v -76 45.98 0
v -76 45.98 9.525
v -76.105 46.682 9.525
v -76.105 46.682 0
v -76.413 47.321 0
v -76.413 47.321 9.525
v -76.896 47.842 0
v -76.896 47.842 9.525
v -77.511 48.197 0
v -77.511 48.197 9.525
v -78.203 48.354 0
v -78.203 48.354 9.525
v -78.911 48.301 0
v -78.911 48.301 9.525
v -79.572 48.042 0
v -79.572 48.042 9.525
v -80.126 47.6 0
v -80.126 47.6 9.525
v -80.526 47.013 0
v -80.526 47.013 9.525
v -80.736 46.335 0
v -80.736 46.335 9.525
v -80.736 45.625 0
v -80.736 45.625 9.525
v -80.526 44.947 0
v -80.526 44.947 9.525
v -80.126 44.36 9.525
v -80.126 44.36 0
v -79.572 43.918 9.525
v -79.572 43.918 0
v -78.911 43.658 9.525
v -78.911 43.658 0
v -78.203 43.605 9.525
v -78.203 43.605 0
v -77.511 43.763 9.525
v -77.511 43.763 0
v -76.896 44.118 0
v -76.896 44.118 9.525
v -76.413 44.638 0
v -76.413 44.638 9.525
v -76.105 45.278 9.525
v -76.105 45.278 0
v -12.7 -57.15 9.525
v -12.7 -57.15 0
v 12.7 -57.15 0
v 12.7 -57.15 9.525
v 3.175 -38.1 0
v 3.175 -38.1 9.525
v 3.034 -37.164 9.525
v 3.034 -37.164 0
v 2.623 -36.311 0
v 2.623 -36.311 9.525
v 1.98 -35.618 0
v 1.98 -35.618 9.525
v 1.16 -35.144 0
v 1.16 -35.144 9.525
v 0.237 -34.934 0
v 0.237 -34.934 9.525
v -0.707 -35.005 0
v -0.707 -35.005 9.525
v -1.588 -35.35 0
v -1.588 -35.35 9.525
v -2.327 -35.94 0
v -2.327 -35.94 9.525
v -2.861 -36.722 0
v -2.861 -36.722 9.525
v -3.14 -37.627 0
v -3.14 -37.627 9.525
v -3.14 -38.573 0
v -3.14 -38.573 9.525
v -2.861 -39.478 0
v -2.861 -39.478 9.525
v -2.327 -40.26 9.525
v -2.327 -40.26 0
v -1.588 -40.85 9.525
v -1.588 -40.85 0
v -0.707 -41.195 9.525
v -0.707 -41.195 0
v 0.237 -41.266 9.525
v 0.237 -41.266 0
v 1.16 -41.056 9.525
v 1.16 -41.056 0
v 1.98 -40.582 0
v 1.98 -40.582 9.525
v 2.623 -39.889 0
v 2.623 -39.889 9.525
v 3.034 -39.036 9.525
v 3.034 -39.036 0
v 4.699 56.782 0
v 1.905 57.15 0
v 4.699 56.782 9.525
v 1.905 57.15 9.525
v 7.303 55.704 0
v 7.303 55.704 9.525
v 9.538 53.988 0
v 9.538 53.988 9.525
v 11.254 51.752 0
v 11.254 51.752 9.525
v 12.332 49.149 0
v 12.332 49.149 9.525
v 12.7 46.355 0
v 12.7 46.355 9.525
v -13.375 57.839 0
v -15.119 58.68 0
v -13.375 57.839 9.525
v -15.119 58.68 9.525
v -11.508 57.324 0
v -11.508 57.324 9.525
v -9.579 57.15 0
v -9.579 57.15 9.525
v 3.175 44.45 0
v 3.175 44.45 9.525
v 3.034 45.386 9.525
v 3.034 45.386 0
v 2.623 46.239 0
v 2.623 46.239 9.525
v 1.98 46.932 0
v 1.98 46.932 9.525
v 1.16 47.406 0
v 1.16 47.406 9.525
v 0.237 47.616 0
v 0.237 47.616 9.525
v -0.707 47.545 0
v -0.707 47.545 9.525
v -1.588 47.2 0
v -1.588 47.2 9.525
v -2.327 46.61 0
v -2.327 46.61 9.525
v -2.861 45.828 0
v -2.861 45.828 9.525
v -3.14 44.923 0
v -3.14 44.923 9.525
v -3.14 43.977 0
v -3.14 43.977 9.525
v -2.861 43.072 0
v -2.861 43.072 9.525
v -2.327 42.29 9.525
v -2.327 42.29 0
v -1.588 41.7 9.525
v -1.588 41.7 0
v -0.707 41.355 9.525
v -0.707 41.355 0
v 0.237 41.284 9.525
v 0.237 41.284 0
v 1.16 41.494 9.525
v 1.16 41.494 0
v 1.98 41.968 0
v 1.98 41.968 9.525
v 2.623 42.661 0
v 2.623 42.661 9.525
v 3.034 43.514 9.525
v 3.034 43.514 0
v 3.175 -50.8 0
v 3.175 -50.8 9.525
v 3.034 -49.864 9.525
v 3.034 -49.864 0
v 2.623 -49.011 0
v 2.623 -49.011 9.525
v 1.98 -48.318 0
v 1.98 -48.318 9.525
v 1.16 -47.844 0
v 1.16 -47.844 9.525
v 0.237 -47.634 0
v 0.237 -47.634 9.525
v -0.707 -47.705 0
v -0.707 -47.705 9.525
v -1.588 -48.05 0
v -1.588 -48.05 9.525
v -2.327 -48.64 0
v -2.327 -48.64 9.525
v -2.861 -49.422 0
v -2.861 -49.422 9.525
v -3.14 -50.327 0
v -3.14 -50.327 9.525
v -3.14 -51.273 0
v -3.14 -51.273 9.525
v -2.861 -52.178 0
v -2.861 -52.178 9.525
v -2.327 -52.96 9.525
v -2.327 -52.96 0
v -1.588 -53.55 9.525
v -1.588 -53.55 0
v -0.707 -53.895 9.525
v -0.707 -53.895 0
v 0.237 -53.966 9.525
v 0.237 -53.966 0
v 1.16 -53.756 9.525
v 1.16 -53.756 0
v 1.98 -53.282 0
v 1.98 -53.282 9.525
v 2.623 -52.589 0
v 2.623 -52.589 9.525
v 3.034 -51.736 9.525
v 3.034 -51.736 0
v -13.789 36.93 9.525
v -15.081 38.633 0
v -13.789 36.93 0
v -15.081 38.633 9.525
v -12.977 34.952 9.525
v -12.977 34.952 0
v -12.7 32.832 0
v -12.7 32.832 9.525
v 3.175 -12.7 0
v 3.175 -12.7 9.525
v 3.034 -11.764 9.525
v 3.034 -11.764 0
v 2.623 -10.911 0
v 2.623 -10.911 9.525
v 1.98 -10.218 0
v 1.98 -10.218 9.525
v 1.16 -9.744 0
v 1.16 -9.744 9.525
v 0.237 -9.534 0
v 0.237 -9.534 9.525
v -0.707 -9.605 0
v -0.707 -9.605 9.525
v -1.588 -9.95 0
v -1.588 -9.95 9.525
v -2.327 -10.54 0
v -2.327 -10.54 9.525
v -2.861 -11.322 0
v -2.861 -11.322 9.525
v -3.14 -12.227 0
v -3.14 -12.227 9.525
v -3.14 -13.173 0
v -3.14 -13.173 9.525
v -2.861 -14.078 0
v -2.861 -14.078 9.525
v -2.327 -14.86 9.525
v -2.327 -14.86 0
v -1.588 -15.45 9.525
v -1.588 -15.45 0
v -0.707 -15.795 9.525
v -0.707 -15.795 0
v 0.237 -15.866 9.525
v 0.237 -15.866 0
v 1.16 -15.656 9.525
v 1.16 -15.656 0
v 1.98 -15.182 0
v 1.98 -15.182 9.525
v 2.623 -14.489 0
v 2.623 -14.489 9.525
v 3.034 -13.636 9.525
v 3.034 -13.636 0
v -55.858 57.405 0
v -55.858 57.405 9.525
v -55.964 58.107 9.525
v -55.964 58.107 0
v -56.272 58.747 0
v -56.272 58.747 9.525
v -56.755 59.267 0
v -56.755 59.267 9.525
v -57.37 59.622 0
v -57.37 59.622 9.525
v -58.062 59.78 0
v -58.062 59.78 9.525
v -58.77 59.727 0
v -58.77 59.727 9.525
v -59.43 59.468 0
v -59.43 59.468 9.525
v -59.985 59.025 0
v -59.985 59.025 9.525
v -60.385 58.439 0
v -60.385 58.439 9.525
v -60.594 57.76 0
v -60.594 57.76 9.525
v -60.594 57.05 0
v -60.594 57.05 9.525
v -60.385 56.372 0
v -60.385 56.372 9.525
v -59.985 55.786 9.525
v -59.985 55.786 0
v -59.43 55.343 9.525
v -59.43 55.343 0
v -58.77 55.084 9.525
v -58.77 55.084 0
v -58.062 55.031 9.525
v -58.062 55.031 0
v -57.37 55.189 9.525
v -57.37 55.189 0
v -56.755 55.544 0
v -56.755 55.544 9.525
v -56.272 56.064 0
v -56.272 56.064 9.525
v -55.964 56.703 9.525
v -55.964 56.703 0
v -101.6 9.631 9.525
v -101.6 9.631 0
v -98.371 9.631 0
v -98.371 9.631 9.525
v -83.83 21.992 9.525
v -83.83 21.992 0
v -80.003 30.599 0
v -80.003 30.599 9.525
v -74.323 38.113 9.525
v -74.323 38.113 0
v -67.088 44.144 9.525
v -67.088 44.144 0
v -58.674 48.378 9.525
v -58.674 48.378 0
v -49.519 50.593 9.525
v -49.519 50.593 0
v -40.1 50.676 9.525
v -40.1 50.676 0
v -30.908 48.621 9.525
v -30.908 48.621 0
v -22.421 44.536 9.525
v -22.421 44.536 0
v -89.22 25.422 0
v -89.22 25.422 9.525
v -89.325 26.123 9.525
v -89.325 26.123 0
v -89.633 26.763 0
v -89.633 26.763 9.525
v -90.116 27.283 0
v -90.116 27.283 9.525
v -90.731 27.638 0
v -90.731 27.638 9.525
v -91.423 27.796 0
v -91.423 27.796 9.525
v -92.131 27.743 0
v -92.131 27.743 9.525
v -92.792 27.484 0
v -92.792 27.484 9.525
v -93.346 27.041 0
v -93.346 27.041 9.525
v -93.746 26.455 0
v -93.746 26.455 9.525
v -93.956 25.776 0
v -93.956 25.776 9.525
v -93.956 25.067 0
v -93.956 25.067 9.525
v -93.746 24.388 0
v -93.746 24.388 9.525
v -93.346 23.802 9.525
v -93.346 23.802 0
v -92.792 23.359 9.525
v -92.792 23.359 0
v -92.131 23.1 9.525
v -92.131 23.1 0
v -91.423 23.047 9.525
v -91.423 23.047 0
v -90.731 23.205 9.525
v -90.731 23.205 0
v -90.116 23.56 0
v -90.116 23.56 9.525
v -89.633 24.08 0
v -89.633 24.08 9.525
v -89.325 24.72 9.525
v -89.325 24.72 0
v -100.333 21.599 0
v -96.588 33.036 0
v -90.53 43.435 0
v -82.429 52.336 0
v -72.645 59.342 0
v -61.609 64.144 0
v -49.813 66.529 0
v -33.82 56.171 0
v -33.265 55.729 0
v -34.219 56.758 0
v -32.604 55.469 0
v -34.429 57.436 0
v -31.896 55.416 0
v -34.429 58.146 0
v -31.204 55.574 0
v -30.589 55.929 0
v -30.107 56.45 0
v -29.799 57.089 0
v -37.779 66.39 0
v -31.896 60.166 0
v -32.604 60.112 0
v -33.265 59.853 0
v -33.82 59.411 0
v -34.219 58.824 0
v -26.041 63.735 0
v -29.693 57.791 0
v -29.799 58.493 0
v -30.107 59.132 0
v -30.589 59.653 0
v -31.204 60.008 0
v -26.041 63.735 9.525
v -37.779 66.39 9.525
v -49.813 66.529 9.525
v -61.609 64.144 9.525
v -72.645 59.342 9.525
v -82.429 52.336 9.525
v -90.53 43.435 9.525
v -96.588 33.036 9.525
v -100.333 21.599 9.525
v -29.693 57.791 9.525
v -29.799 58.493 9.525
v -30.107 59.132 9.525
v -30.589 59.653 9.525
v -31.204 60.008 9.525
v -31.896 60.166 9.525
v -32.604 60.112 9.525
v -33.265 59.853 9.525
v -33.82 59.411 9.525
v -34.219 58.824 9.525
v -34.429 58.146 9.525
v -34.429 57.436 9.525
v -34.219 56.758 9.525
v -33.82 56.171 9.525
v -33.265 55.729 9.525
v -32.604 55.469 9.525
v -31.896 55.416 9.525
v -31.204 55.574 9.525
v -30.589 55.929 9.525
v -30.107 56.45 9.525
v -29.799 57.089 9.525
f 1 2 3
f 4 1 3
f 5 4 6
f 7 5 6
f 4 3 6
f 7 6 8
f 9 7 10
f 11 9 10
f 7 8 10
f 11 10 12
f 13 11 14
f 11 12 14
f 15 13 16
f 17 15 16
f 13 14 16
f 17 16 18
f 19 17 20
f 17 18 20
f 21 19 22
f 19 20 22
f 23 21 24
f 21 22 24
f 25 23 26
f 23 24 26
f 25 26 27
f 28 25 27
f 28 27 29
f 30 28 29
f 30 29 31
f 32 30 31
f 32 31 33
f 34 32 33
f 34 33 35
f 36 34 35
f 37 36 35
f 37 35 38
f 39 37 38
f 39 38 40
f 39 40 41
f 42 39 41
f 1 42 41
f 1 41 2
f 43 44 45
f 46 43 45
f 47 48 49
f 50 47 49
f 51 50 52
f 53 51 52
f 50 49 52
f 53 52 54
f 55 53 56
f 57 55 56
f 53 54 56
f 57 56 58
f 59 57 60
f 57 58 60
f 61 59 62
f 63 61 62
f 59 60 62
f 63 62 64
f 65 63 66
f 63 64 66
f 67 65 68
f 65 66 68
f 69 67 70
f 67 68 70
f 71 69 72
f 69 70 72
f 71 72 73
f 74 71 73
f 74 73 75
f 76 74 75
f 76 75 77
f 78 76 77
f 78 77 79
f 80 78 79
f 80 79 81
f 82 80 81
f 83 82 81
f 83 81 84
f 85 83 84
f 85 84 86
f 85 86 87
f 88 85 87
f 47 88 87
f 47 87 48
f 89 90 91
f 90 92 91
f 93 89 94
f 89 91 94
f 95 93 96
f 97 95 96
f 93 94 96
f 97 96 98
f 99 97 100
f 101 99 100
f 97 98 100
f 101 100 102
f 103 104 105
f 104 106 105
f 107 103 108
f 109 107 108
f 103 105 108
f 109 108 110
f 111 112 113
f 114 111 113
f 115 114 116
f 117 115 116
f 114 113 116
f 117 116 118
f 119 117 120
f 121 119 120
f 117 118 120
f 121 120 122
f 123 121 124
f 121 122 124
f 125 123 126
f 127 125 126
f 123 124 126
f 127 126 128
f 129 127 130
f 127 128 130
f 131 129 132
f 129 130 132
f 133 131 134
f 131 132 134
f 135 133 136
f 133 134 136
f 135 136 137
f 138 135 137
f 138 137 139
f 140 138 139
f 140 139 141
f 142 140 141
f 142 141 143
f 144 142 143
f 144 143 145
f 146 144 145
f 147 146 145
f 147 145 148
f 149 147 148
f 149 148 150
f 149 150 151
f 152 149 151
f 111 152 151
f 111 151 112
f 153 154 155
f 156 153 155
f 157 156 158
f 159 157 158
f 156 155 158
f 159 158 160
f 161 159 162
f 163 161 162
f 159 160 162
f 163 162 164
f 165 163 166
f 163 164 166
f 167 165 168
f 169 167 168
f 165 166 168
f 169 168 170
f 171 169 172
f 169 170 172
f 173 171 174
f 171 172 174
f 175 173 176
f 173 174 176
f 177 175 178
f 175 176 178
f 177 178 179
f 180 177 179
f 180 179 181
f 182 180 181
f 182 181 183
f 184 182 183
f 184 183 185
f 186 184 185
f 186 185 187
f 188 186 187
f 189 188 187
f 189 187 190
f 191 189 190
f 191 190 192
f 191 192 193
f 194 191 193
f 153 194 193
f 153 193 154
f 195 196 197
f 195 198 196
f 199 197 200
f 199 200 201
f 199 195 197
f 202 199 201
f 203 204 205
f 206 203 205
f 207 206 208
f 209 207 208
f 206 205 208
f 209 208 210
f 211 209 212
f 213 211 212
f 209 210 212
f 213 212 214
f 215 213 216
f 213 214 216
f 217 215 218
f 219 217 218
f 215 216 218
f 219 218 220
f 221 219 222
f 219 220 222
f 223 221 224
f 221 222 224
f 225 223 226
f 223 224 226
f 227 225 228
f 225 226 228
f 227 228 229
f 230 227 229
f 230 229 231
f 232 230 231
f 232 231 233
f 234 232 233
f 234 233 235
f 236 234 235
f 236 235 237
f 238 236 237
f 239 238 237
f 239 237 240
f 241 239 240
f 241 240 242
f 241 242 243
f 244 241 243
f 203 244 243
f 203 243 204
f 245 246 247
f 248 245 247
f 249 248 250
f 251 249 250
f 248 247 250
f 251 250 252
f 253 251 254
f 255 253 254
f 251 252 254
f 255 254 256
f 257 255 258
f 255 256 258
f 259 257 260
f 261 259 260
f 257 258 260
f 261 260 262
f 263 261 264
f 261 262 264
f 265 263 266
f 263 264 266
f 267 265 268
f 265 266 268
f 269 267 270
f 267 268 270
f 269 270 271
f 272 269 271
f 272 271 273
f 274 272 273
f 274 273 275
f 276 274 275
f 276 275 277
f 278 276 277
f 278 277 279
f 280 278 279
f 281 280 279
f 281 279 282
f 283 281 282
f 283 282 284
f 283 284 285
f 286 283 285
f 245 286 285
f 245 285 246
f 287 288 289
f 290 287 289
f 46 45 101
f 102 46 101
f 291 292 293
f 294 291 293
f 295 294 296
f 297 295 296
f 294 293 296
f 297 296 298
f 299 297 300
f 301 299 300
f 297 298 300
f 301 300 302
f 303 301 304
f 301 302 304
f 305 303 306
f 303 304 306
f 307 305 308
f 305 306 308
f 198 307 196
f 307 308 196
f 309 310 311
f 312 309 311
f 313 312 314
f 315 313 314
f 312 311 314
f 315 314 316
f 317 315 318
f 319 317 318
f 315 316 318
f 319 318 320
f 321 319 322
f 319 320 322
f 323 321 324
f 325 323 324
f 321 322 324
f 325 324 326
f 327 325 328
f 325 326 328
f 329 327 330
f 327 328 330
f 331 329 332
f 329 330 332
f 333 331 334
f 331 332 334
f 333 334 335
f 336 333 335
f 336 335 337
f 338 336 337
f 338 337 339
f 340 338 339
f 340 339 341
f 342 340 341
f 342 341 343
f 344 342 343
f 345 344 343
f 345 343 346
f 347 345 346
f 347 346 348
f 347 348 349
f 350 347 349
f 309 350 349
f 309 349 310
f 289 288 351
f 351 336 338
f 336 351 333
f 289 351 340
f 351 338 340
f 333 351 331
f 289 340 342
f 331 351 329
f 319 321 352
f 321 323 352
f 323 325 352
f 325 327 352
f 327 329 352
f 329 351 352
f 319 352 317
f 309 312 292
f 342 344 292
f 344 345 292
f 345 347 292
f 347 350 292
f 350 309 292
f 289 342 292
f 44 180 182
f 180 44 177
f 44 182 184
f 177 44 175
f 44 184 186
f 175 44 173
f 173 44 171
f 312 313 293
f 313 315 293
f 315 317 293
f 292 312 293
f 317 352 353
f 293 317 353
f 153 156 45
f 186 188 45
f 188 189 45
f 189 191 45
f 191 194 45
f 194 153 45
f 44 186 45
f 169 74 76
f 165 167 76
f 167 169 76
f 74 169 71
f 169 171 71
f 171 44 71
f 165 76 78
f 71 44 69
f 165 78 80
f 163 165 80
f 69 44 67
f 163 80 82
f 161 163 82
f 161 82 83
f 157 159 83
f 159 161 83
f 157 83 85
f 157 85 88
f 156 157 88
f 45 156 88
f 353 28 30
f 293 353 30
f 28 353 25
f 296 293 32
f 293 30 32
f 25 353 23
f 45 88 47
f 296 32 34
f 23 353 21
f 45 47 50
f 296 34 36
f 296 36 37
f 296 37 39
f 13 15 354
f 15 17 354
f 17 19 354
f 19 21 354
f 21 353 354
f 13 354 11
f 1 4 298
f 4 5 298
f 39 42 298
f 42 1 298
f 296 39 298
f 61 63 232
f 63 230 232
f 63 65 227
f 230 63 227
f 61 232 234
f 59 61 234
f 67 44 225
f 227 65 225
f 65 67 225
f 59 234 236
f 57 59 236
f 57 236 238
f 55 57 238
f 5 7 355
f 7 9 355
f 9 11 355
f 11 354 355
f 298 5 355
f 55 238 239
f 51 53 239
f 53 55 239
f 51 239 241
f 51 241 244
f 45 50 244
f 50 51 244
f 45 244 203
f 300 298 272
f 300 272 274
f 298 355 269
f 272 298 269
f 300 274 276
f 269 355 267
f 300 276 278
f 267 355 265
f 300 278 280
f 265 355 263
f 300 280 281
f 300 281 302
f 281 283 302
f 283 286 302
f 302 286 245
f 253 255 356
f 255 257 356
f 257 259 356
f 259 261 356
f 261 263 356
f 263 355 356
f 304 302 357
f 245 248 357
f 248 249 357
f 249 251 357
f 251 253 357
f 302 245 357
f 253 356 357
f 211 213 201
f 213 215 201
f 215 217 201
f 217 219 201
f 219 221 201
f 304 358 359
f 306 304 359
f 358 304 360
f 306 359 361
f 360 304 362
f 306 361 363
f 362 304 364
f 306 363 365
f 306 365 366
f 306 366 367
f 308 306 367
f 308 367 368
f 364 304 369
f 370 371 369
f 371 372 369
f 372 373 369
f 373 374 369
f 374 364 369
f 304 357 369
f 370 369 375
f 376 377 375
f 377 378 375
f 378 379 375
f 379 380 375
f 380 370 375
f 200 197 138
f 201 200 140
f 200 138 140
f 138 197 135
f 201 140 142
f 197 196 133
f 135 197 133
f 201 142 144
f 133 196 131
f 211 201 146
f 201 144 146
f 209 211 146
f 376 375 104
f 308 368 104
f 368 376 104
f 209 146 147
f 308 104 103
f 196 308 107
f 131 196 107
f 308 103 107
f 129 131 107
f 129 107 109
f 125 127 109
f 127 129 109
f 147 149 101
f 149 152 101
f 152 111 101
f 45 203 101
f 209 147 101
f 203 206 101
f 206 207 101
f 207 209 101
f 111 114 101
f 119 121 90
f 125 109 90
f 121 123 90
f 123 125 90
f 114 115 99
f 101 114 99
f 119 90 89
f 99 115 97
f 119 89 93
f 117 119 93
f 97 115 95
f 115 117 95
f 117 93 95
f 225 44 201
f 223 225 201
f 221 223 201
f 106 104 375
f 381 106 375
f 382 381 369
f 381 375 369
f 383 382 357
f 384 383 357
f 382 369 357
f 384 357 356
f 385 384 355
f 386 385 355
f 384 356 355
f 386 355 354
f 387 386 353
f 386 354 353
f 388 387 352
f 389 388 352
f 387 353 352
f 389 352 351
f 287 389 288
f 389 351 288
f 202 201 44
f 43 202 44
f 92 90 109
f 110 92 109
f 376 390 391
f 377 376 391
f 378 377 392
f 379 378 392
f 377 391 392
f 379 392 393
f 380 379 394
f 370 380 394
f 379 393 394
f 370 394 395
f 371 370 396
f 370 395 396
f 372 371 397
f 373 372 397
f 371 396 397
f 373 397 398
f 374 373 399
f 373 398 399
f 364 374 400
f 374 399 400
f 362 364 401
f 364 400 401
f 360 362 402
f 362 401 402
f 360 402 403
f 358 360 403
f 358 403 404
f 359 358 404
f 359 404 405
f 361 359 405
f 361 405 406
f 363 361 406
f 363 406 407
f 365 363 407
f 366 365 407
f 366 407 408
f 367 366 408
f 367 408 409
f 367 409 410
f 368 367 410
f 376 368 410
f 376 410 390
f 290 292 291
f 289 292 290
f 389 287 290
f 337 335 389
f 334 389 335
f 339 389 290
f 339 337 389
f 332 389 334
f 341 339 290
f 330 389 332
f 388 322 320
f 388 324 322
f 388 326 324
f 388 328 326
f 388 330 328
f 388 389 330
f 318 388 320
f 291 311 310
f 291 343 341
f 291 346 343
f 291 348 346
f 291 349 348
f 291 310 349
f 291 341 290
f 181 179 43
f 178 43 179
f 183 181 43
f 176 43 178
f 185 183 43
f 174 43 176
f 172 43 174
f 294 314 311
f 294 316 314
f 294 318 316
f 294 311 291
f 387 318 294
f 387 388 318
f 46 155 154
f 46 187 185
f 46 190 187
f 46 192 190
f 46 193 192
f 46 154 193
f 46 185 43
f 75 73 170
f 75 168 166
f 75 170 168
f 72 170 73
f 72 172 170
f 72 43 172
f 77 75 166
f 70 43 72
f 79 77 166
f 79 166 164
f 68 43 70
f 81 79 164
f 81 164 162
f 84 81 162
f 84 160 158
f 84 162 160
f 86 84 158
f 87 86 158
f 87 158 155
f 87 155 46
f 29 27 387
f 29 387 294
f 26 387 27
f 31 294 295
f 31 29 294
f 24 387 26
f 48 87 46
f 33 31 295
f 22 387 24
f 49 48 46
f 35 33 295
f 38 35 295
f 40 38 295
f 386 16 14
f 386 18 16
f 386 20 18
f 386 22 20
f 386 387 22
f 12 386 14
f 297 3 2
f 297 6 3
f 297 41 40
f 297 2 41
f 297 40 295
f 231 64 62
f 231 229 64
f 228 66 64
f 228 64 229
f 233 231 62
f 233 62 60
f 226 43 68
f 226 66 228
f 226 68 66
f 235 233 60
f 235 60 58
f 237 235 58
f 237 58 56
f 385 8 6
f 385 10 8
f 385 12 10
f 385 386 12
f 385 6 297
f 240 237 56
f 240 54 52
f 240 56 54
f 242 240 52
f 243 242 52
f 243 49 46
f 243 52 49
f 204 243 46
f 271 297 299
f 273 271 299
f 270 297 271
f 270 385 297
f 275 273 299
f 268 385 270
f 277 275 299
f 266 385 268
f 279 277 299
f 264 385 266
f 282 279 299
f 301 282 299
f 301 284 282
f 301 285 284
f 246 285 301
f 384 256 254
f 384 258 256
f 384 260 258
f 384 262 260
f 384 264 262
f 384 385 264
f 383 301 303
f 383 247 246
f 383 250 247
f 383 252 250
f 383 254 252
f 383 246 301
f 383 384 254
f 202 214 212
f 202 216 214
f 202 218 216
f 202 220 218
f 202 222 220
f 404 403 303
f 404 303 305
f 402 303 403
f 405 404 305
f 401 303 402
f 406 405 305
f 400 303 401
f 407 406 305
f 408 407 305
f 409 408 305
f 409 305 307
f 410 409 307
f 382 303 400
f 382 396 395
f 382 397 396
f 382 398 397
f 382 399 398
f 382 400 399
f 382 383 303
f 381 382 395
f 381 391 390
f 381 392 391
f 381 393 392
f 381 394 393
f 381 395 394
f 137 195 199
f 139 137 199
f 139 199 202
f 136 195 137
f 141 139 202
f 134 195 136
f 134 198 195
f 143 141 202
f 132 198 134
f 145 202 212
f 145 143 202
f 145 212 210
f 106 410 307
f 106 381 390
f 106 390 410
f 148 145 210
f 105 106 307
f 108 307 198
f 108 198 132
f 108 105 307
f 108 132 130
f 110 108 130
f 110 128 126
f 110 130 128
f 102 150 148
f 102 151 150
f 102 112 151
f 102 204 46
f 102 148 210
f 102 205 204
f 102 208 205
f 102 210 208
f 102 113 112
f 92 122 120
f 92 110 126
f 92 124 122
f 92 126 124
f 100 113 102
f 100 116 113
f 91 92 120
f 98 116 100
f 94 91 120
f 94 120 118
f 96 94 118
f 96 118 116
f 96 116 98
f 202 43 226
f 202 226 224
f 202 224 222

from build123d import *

# Parameters (mm, degrees)
BOSS_EXTRUDE1_DEPTH = 9.525
FILLET1_R           = 8.255
FILLET3_R           = 10.795
SKETCH2_R           = 3.175
CUT_EXTRUDE1_DEPTH  = 122.954832076
SKETCH3_R           = 3.175
SKETCH3_R_2         = 2.38125
CUT_EXTRUDE2_DEPTH  = 122.954832076


with BuildPart() as part:
    # Sketch1 → Boss-Extrude1 (new body)
    with BuildSketch(Plane.XY):
        with BuildLine():
            Line((12.7, 57.15), (-12.7, 57.15))
            ThreePointArc((-12.7, 57.15), (-71.390768363, 60.032513664), (-101.6, 9.630951188))
            Line((-101.6, 9.630951188), (-85.725, 9.630951188))
            ThreePointArc((-85.725, 9.630951188), (-58.470420375, 48.45173734), (-12.7, 36.004481953))
            Line((-12.7, 36.004481953), (-12.7, -57.15))
            Line((-12.7, -57.15), (12.7, -57.15))
            Line((12.7, -57.15), (12.7, 57.15))
        make_face()
    extrude(amount=BOSS_EXTRUDE1_DEPTH)

    # Fillet1
    fillet1_edges = [part.edges().sort_by_distance(p)[0] for p in [
        (-12.7, 36.004481953, 4.7625),
    ]]
    fillet(fillet1_edges, radius=FILLET1_R)

    # Chamfer1
    # the kernel refuses this chamfer: 16.925734726, 15.24 mm, written as the material it takes off along each edge
    with BuildSketch(Plane(origin=(-85.725, 9.630951188, -32.922584323), x_dir=(0.18505799374320953, 0.982727601602671, 0), z_dir=(0, 0, 1))) as chamfer1_piece_1:
        with BuildLine():
            Line((13.024984464, 0), (-2.866629235, 12.853244189))
            Line((-2.866629235, 12.853244189), (-3.199296969, 12.790599339))
            ThreePointArc((-3.199296969, 12.790599339), (-1.550509453, 6.404553068), (-0.332667734, -0.06264485))
            Line((-0.332667734, -0.06264485), (0.06264485, -0.332667734))
            ThreePointArc((0.06264485, -0.332667734), (6.502538231, 0.358645822), (12.985122864, -0.336159562))
            Line((12.985122864, -0.336159562), (13.024984464, 0))
        make_face()
    extrude(amount=75.370168646, mode=Mode.SUBTRACT)

    # Fillet3
    fillet3_edges = [part.edges().sort_by_distance(p)[0] for p in [
        (-12.7, 57.15, 4.7625),
        (12.7, 57.15, 4.7625),
    ]]
    fillet(fillet3_edges, radius=FILLET3_R)

    # Sketch2 → Cut-Extrude1 (cut, through all)
    with BuildSketch(Plane.XY.offset(9.525)):
        with Locations((0, -50.8)):
            Circle(SKETCH2_R)
        with Locations((0, -38.1)):
            Circle(SKETCH2_R)
    extrude(amount=-CUT_EXTRUDE1_DEPTH, mode=Mode.SUBTRACT)

    # Sketch3 → Cut-Extrude2 (cut, through all)
    with BuildSketch(Plane.XY.offset(9.525)):
        with Locations((0, -12.7)):
            Circle(SKETCH3_R)
        with Locations((0, 44.45)):
            Circle(SKETCH3_R)
        with Locations((-91.600885684, 25.42155909)):
            Circle(SKETCH3_R_2)
        with Locations((-78.380902496, 45.979860037)):
            Circle(SKETCH3_R_2)
        with Locations((-58.239749026, 57.405339102)):
            Circle(SKETCH3_R_2)
        with Locations((-32.074025979, 57.790940658)):
            Circle(SKETCH3_R_2)
    extrude(amount=-CUT_EXTRUDE2_DEPTH, mode=Mode.SUBTRACT)


solid = part.part
